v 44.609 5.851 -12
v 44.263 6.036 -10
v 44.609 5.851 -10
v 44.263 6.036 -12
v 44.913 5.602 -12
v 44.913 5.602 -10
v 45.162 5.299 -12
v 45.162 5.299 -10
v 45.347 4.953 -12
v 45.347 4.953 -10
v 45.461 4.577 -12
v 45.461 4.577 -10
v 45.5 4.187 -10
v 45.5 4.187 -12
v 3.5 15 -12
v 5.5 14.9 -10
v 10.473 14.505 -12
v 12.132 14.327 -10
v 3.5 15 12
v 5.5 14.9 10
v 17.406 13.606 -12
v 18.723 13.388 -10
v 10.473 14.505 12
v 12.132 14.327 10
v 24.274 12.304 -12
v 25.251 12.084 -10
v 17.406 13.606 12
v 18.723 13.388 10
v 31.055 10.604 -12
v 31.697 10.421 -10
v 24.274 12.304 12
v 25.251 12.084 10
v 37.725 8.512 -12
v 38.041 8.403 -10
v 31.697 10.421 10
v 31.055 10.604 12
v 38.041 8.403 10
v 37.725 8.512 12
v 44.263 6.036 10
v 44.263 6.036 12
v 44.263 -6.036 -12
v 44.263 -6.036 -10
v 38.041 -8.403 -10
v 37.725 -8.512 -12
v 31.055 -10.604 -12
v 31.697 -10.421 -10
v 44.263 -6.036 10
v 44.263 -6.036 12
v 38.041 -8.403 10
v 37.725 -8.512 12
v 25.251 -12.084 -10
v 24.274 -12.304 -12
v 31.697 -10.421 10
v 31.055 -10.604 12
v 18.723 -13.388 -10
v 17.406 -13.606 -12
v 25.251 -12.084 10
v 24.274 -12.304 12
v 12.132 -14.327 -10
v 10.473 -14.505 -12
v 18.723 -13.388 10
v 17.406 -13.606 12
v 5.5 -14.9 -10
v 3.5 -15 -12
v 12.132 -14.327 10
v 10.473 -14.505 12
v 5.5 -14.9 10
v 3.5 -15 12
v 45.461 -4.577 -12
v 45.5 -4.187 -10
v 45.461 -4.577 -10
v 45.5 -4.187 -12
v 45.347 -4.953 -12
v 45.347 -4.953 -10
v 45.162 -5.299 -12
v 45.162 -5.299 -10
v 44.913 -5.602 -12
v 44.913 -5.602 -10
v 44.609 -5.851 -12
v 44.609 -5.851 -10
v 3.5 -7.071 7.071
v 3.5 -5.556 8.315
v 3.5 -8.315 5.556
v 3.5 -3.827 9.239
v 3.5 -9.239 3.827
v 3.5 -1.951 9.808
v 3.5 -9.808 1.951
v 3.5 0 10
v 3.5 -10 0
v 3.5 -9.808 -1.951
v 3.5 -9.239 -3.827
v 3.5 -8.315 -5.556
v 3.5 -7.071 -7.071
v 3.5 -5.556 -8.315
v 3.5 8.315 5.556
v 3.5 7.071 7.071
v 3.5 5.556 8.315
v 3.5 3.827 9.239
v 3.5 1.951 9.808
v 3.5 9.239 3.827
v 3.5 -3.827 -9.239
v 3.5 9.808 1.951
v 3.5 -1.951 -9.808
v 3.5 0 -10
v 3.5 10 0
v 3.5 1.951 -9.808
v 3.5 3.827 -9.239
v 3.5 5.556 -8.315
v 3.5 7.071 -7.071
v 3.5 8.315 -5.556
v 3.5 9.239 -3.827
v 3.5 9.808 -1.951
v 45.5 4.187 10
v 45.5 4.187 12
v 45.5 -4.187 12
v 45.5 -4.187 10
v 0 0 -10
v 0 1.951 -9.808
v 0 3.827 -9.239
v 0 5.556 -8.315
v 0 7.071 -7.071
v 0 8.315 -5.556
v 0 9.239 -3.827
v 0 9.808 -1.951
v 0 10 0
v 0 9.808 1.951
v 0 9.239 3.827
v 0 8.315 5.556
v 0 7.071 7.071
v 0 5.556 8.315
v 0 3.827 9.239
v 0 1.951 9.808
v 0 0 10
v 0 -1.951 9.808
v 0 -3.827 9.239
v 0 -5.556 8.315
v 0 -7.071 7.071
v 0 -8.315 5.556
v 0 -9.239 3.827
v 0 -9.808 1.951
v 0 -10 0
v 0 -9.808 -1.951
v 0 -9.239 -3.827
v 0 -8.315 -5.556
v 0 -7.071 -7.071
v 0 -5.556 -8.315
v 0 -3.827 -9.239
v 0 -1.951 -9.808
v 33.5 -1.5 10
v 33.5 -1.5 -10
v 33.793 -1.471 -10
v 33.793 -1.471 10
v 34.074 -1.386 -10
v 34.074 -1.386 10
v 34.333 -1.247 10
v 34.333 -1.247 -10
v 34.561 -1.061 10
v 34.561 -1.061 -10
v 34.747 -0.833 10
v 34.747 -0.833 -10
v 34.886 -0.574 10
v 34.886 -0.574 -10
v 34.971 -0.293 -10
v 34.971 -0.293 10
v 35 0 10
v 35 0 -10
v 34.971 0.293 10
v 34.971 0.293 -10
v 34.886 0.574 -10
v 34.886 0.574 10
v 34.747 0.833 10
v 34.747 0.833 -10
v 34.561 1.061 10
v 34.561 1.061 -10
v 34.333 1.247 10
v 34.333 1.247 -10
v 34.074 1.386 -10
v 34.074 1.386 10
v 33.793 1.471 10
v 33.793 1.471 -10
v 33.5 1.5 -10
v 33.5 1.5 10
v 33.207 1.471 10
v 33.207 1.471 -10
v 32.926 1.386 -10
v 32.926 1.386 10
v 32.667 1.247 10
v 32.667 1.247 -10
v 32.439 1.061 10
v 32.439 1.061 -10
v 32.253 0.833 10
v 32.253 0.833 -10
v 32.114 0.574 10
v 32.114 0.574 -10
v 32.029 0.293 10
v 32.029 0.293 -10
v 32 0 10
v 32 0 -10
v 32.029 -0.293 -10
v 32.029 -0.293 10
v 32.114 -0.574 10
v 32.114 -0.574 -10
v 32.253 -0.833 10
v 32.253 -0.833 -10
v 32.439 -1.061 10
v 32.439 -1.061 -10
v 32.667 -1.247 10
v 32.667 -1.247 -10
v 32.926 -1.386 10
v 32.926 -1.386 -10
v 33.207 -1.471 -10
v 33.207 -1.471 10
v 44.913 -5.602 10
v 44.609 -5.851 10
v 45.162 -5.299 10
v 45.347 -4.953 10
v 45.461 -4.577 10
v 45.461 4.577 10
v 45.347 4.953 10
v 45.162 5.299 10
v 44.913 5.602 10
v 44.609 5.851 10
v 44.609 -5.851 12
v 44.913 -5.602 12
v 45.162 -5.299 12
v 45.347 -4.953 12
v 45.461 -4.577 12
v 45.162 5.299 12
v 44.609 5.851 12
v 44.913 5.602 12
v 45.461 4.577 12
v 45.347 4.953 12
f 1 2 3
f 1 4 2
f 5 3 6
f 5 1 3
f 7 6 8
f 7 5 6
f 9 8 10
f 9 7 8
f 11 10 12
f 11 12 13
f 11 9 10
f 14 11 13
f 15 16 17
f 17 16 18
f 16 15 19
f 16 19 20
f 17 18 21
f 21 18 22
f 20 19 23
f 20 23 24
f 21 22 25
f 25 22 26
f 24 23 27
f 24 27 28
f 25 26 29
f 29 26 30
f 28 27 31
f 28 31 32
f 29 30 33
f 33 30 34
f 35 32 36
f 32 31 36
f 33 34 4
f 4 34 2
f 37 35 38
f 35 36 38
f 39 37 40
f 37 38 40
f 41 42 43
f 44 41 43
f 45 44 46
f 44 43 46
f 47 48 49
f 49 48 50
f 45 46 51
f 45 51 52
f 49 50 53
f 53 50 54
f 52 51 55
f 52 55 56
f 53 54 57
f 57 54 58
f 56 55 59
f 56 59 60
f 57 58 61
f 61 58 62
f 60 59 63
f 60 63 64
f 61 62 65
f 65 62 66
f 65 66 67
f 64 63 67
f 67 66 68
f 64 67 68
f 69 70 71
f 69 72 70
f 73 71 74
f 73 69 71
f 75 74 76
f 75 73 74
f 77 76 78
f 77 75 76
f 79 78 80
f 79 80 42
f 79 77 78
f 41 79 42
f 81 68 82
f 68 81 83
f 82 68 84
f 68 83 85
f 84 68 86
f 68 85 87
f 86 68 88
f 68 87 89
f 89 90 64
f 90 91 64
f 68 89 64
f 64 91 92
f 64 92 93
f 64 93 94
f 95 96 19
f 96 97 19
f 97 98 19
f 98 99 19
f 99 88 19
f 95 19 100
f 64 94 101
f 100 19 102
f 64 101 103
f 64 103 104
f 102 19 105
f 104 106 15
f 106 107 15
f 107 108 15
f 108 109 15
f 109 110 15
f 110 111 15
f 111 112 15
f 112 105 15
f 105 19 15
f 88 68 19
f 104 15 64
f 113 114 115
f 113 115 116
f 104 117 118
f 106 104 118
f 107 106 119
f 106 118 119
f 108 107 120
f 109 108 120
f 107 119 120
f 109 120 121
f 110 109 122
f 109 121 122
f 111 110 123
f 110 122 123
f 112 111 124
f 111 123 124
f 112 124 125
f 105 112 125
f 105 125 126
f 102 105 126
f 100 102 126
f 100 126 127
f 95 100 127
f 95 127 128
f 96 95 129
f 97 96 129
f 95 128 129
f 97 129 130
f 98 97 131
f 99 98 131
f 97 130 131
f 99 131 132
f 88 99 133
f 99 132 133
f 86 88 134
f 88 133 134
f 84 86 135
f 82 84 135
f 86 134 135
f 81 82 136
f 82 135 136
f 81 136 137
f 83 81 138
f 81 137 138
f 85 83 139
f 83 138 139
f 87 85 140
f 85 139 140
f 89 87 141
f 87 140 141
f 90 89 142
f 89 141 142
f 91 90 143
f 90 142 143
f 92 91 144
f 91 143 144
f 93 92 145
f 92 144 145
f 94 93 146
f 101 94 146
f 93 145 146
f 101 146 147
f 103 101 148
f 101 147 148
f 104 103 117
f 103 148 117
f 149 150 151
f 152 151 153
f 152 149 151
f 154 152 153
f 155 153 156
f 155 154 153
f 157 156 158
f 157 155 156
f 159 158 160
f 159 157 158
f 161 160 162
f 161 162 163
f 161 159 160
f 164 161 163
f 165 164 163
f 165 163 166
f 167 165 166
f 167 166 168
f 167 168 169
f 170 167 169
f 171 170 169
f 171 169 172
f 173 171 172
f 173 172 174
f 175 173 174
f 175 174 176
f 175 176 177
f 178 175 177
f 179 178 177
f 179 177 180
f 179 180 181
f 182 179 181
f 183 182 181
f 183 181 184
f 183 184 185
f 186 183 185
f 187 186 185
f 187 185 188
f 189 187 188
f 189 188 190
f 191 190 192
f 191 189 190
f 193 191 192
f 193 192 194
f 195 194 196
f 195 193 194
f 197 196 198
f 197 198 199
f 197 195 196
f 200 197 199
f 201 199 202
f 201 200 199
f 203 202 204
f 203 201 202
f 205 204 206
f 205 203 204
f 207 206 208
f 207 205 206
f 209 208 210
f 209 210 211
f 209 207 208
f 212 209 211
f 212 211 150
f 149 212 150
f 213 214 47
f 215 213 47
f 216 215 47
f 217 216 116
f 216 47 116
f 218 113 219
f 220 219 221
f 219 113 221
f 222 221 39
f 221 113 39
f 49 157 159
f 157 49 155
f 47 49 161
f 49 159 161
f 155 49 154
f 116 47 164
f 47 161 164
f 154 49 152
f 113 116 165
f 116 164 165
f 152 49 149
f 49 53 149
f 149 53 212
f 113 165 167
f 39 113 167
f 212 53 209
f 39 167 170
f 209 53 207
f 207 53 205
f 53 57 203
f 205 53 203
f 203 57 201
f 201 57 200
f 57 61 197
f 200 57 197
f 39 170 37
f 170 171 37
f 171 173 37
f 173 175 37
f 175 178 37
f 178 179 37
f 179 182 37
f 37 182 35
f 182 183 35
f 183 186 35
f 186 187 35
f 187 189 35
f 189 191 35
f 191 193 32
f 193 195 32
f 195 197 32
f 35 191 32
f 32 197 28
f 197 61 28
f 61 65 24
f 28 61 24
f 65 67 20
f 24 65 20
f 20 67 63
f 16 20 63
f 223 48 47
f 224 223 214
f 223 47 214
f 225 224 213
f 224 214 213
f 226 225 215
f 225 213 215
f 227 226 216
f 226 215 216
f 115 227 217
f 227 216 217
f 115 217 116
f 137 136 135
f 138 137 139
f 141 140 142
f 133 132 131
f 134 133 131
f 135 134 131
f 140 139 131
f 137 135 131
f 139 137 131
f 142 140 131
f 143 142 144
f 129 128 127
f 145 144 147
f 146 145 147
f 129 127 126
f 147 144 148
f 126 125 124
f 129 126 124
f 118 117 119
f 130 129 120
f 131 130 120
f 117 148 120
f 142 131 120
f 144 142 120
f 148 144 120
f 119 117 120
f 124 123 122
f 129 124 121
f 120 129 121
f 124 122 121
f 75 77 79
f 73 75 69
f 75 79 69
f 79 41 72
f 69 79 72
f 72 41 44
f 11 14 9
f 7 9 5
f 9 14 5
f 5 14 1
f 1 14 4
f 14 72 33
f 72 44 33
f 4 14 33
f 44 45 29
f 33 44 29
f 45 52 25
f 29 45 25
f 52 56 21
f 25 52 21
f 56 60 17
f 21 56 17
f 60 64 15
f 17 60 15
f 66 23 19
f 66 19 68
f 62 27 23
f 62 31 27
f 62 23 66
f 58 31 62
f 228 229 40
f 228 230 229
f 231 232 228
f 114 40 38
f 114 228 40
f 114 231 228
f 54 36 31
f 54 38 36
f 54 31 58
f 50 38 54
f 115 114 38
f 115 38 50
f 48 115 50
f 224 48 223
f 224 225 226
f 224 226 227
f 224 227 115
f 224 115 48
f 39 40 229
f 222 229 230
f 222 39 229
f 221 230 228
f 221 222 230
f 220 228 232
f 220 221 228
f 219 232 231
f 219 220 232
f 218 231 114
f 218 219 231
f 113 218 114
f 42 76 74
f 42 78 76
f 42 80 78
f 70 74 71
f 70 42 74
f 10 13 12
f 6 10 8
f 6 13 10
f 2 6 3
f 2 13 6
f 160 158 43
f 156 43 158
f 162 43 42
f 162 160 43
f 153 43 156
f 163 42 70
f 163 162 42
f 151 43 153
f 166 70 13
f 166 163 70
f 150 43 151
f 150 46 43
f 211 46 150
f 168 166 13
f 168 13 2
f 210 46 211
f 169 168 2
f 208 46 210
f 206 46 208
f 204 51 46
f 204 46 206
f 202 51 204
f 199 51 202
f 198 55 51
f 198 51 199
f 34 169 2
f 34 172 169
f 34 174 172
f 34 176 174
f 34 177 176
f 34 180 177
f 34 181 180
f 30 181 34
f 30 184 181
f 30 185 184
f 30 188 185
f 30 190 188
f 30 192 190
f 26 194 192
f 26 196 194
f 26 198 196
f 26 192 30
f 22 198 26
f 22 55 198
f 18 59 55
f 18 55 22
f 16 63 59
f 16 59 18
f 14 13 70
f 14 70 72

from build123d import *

# Parameters (mm, degrees)
SKETCH_1_R          = 10
EXTRUDE_1_DEPTH     = 3.5
SKETCH_2_W          = 24
SKETCH_2_H          = 30
EXTRUDE_2_DEPTH     = 2
SKETCH_3_W          = 2
SKETCH_3_H          = 30
EXTRUDE_3_DEPTH     = 40
CUT_EXTRUDE_1_DEPTH = 40
FILLET_1_R          = 2
SKETCH_5_R          = 1.5
EXTRUDE_4_DEPTH     = 24


with BuildPart() as part:
    # 草图1 → 凸台-拉伸1 (new body)
    with BuildSketch(Plane(origin=(0, 0, 0), x_dir=(0, 0, -1), z_dir=(1, 0, 0))):
        Circle(SKETCH_1_R)
    extrude(amount=EXTRUDE_1_DEPTH)

    # 草图2 → 凸台-拉伸2 (add)
    with BuildSketch(Plane(origin=(3.5, 0, 0), x_dir=(0, 0, -1), z_dir=(1, 0, 0))):
        Rectangle(SKETCH_2_W, SKETCH_2_H)
    extrude(amount=EXTRUDE_2_DEPTH)

    # 草图3 → 凸台-拉伸3 (add)
    with BuildSketch(Plane(origin=(5.5, 0, 0), x_dir=(0, 0, -1), z_dir=(1, 0, 0))):
        with Locations((11, 0)):
            Rectangle(SKETCH_3_W, SKETCH_3_H)
        with Locations((-11, 0)):
            Rectangle(SKETCH_3_W, SKETCH_3_H)
    extrude(amount=EXTRUDE_3_DEPTH)

    # 草图4 → 切除-拉伸1 (cut)
    with BuildSketch(Plane.XY.offset(12)):
        with BuildLine():
            Line((45.5, 5.517073487), (45.5, 15))
            Line((45.5, 15), (3.5, 15))
            ThreePointArc((3.5, 15), (24.928800083, 12.157697667), (45.5, 5.517073487))
        make_face()
        with BuildLine():
            Line((3.5, -15), (45.5, -15))
            Line((45.5, -15), (45.5, -5.517073487))
            ThreePointArc((45.5, -5.517073487), (24.928800083, -12.157697667), (3.5, -15))
        make_face()
    extrude(amount=-CUT_EXTRUDE_1_DEPTH, mode=Mode.SUBTRACT)

    # 圆角1
    fillet_1_edges = [part.edges().sort_by_distance(p)[0] for p in [
        (45.5, -5.517073487, 11),
        (45.5, 5.517073487, 11),
        (45.5, 5.517073487, -11),
        (45.5, -5.517073487, -11),
    ]]
    fillet(fillet_1_edges, radius=FILLET_1_R)

    # 草图5 → 凸台-拉伸4 (add)
    with BuildSketch(Plane.XY.offset(12)):
        with Locations(Location((33.5, 0, 0), (0, 0, 270))):
            Circle(SKETCH_5_R)
    extrude(amount=-EXTRUDE_4_DEPTH)


solid = part.part
